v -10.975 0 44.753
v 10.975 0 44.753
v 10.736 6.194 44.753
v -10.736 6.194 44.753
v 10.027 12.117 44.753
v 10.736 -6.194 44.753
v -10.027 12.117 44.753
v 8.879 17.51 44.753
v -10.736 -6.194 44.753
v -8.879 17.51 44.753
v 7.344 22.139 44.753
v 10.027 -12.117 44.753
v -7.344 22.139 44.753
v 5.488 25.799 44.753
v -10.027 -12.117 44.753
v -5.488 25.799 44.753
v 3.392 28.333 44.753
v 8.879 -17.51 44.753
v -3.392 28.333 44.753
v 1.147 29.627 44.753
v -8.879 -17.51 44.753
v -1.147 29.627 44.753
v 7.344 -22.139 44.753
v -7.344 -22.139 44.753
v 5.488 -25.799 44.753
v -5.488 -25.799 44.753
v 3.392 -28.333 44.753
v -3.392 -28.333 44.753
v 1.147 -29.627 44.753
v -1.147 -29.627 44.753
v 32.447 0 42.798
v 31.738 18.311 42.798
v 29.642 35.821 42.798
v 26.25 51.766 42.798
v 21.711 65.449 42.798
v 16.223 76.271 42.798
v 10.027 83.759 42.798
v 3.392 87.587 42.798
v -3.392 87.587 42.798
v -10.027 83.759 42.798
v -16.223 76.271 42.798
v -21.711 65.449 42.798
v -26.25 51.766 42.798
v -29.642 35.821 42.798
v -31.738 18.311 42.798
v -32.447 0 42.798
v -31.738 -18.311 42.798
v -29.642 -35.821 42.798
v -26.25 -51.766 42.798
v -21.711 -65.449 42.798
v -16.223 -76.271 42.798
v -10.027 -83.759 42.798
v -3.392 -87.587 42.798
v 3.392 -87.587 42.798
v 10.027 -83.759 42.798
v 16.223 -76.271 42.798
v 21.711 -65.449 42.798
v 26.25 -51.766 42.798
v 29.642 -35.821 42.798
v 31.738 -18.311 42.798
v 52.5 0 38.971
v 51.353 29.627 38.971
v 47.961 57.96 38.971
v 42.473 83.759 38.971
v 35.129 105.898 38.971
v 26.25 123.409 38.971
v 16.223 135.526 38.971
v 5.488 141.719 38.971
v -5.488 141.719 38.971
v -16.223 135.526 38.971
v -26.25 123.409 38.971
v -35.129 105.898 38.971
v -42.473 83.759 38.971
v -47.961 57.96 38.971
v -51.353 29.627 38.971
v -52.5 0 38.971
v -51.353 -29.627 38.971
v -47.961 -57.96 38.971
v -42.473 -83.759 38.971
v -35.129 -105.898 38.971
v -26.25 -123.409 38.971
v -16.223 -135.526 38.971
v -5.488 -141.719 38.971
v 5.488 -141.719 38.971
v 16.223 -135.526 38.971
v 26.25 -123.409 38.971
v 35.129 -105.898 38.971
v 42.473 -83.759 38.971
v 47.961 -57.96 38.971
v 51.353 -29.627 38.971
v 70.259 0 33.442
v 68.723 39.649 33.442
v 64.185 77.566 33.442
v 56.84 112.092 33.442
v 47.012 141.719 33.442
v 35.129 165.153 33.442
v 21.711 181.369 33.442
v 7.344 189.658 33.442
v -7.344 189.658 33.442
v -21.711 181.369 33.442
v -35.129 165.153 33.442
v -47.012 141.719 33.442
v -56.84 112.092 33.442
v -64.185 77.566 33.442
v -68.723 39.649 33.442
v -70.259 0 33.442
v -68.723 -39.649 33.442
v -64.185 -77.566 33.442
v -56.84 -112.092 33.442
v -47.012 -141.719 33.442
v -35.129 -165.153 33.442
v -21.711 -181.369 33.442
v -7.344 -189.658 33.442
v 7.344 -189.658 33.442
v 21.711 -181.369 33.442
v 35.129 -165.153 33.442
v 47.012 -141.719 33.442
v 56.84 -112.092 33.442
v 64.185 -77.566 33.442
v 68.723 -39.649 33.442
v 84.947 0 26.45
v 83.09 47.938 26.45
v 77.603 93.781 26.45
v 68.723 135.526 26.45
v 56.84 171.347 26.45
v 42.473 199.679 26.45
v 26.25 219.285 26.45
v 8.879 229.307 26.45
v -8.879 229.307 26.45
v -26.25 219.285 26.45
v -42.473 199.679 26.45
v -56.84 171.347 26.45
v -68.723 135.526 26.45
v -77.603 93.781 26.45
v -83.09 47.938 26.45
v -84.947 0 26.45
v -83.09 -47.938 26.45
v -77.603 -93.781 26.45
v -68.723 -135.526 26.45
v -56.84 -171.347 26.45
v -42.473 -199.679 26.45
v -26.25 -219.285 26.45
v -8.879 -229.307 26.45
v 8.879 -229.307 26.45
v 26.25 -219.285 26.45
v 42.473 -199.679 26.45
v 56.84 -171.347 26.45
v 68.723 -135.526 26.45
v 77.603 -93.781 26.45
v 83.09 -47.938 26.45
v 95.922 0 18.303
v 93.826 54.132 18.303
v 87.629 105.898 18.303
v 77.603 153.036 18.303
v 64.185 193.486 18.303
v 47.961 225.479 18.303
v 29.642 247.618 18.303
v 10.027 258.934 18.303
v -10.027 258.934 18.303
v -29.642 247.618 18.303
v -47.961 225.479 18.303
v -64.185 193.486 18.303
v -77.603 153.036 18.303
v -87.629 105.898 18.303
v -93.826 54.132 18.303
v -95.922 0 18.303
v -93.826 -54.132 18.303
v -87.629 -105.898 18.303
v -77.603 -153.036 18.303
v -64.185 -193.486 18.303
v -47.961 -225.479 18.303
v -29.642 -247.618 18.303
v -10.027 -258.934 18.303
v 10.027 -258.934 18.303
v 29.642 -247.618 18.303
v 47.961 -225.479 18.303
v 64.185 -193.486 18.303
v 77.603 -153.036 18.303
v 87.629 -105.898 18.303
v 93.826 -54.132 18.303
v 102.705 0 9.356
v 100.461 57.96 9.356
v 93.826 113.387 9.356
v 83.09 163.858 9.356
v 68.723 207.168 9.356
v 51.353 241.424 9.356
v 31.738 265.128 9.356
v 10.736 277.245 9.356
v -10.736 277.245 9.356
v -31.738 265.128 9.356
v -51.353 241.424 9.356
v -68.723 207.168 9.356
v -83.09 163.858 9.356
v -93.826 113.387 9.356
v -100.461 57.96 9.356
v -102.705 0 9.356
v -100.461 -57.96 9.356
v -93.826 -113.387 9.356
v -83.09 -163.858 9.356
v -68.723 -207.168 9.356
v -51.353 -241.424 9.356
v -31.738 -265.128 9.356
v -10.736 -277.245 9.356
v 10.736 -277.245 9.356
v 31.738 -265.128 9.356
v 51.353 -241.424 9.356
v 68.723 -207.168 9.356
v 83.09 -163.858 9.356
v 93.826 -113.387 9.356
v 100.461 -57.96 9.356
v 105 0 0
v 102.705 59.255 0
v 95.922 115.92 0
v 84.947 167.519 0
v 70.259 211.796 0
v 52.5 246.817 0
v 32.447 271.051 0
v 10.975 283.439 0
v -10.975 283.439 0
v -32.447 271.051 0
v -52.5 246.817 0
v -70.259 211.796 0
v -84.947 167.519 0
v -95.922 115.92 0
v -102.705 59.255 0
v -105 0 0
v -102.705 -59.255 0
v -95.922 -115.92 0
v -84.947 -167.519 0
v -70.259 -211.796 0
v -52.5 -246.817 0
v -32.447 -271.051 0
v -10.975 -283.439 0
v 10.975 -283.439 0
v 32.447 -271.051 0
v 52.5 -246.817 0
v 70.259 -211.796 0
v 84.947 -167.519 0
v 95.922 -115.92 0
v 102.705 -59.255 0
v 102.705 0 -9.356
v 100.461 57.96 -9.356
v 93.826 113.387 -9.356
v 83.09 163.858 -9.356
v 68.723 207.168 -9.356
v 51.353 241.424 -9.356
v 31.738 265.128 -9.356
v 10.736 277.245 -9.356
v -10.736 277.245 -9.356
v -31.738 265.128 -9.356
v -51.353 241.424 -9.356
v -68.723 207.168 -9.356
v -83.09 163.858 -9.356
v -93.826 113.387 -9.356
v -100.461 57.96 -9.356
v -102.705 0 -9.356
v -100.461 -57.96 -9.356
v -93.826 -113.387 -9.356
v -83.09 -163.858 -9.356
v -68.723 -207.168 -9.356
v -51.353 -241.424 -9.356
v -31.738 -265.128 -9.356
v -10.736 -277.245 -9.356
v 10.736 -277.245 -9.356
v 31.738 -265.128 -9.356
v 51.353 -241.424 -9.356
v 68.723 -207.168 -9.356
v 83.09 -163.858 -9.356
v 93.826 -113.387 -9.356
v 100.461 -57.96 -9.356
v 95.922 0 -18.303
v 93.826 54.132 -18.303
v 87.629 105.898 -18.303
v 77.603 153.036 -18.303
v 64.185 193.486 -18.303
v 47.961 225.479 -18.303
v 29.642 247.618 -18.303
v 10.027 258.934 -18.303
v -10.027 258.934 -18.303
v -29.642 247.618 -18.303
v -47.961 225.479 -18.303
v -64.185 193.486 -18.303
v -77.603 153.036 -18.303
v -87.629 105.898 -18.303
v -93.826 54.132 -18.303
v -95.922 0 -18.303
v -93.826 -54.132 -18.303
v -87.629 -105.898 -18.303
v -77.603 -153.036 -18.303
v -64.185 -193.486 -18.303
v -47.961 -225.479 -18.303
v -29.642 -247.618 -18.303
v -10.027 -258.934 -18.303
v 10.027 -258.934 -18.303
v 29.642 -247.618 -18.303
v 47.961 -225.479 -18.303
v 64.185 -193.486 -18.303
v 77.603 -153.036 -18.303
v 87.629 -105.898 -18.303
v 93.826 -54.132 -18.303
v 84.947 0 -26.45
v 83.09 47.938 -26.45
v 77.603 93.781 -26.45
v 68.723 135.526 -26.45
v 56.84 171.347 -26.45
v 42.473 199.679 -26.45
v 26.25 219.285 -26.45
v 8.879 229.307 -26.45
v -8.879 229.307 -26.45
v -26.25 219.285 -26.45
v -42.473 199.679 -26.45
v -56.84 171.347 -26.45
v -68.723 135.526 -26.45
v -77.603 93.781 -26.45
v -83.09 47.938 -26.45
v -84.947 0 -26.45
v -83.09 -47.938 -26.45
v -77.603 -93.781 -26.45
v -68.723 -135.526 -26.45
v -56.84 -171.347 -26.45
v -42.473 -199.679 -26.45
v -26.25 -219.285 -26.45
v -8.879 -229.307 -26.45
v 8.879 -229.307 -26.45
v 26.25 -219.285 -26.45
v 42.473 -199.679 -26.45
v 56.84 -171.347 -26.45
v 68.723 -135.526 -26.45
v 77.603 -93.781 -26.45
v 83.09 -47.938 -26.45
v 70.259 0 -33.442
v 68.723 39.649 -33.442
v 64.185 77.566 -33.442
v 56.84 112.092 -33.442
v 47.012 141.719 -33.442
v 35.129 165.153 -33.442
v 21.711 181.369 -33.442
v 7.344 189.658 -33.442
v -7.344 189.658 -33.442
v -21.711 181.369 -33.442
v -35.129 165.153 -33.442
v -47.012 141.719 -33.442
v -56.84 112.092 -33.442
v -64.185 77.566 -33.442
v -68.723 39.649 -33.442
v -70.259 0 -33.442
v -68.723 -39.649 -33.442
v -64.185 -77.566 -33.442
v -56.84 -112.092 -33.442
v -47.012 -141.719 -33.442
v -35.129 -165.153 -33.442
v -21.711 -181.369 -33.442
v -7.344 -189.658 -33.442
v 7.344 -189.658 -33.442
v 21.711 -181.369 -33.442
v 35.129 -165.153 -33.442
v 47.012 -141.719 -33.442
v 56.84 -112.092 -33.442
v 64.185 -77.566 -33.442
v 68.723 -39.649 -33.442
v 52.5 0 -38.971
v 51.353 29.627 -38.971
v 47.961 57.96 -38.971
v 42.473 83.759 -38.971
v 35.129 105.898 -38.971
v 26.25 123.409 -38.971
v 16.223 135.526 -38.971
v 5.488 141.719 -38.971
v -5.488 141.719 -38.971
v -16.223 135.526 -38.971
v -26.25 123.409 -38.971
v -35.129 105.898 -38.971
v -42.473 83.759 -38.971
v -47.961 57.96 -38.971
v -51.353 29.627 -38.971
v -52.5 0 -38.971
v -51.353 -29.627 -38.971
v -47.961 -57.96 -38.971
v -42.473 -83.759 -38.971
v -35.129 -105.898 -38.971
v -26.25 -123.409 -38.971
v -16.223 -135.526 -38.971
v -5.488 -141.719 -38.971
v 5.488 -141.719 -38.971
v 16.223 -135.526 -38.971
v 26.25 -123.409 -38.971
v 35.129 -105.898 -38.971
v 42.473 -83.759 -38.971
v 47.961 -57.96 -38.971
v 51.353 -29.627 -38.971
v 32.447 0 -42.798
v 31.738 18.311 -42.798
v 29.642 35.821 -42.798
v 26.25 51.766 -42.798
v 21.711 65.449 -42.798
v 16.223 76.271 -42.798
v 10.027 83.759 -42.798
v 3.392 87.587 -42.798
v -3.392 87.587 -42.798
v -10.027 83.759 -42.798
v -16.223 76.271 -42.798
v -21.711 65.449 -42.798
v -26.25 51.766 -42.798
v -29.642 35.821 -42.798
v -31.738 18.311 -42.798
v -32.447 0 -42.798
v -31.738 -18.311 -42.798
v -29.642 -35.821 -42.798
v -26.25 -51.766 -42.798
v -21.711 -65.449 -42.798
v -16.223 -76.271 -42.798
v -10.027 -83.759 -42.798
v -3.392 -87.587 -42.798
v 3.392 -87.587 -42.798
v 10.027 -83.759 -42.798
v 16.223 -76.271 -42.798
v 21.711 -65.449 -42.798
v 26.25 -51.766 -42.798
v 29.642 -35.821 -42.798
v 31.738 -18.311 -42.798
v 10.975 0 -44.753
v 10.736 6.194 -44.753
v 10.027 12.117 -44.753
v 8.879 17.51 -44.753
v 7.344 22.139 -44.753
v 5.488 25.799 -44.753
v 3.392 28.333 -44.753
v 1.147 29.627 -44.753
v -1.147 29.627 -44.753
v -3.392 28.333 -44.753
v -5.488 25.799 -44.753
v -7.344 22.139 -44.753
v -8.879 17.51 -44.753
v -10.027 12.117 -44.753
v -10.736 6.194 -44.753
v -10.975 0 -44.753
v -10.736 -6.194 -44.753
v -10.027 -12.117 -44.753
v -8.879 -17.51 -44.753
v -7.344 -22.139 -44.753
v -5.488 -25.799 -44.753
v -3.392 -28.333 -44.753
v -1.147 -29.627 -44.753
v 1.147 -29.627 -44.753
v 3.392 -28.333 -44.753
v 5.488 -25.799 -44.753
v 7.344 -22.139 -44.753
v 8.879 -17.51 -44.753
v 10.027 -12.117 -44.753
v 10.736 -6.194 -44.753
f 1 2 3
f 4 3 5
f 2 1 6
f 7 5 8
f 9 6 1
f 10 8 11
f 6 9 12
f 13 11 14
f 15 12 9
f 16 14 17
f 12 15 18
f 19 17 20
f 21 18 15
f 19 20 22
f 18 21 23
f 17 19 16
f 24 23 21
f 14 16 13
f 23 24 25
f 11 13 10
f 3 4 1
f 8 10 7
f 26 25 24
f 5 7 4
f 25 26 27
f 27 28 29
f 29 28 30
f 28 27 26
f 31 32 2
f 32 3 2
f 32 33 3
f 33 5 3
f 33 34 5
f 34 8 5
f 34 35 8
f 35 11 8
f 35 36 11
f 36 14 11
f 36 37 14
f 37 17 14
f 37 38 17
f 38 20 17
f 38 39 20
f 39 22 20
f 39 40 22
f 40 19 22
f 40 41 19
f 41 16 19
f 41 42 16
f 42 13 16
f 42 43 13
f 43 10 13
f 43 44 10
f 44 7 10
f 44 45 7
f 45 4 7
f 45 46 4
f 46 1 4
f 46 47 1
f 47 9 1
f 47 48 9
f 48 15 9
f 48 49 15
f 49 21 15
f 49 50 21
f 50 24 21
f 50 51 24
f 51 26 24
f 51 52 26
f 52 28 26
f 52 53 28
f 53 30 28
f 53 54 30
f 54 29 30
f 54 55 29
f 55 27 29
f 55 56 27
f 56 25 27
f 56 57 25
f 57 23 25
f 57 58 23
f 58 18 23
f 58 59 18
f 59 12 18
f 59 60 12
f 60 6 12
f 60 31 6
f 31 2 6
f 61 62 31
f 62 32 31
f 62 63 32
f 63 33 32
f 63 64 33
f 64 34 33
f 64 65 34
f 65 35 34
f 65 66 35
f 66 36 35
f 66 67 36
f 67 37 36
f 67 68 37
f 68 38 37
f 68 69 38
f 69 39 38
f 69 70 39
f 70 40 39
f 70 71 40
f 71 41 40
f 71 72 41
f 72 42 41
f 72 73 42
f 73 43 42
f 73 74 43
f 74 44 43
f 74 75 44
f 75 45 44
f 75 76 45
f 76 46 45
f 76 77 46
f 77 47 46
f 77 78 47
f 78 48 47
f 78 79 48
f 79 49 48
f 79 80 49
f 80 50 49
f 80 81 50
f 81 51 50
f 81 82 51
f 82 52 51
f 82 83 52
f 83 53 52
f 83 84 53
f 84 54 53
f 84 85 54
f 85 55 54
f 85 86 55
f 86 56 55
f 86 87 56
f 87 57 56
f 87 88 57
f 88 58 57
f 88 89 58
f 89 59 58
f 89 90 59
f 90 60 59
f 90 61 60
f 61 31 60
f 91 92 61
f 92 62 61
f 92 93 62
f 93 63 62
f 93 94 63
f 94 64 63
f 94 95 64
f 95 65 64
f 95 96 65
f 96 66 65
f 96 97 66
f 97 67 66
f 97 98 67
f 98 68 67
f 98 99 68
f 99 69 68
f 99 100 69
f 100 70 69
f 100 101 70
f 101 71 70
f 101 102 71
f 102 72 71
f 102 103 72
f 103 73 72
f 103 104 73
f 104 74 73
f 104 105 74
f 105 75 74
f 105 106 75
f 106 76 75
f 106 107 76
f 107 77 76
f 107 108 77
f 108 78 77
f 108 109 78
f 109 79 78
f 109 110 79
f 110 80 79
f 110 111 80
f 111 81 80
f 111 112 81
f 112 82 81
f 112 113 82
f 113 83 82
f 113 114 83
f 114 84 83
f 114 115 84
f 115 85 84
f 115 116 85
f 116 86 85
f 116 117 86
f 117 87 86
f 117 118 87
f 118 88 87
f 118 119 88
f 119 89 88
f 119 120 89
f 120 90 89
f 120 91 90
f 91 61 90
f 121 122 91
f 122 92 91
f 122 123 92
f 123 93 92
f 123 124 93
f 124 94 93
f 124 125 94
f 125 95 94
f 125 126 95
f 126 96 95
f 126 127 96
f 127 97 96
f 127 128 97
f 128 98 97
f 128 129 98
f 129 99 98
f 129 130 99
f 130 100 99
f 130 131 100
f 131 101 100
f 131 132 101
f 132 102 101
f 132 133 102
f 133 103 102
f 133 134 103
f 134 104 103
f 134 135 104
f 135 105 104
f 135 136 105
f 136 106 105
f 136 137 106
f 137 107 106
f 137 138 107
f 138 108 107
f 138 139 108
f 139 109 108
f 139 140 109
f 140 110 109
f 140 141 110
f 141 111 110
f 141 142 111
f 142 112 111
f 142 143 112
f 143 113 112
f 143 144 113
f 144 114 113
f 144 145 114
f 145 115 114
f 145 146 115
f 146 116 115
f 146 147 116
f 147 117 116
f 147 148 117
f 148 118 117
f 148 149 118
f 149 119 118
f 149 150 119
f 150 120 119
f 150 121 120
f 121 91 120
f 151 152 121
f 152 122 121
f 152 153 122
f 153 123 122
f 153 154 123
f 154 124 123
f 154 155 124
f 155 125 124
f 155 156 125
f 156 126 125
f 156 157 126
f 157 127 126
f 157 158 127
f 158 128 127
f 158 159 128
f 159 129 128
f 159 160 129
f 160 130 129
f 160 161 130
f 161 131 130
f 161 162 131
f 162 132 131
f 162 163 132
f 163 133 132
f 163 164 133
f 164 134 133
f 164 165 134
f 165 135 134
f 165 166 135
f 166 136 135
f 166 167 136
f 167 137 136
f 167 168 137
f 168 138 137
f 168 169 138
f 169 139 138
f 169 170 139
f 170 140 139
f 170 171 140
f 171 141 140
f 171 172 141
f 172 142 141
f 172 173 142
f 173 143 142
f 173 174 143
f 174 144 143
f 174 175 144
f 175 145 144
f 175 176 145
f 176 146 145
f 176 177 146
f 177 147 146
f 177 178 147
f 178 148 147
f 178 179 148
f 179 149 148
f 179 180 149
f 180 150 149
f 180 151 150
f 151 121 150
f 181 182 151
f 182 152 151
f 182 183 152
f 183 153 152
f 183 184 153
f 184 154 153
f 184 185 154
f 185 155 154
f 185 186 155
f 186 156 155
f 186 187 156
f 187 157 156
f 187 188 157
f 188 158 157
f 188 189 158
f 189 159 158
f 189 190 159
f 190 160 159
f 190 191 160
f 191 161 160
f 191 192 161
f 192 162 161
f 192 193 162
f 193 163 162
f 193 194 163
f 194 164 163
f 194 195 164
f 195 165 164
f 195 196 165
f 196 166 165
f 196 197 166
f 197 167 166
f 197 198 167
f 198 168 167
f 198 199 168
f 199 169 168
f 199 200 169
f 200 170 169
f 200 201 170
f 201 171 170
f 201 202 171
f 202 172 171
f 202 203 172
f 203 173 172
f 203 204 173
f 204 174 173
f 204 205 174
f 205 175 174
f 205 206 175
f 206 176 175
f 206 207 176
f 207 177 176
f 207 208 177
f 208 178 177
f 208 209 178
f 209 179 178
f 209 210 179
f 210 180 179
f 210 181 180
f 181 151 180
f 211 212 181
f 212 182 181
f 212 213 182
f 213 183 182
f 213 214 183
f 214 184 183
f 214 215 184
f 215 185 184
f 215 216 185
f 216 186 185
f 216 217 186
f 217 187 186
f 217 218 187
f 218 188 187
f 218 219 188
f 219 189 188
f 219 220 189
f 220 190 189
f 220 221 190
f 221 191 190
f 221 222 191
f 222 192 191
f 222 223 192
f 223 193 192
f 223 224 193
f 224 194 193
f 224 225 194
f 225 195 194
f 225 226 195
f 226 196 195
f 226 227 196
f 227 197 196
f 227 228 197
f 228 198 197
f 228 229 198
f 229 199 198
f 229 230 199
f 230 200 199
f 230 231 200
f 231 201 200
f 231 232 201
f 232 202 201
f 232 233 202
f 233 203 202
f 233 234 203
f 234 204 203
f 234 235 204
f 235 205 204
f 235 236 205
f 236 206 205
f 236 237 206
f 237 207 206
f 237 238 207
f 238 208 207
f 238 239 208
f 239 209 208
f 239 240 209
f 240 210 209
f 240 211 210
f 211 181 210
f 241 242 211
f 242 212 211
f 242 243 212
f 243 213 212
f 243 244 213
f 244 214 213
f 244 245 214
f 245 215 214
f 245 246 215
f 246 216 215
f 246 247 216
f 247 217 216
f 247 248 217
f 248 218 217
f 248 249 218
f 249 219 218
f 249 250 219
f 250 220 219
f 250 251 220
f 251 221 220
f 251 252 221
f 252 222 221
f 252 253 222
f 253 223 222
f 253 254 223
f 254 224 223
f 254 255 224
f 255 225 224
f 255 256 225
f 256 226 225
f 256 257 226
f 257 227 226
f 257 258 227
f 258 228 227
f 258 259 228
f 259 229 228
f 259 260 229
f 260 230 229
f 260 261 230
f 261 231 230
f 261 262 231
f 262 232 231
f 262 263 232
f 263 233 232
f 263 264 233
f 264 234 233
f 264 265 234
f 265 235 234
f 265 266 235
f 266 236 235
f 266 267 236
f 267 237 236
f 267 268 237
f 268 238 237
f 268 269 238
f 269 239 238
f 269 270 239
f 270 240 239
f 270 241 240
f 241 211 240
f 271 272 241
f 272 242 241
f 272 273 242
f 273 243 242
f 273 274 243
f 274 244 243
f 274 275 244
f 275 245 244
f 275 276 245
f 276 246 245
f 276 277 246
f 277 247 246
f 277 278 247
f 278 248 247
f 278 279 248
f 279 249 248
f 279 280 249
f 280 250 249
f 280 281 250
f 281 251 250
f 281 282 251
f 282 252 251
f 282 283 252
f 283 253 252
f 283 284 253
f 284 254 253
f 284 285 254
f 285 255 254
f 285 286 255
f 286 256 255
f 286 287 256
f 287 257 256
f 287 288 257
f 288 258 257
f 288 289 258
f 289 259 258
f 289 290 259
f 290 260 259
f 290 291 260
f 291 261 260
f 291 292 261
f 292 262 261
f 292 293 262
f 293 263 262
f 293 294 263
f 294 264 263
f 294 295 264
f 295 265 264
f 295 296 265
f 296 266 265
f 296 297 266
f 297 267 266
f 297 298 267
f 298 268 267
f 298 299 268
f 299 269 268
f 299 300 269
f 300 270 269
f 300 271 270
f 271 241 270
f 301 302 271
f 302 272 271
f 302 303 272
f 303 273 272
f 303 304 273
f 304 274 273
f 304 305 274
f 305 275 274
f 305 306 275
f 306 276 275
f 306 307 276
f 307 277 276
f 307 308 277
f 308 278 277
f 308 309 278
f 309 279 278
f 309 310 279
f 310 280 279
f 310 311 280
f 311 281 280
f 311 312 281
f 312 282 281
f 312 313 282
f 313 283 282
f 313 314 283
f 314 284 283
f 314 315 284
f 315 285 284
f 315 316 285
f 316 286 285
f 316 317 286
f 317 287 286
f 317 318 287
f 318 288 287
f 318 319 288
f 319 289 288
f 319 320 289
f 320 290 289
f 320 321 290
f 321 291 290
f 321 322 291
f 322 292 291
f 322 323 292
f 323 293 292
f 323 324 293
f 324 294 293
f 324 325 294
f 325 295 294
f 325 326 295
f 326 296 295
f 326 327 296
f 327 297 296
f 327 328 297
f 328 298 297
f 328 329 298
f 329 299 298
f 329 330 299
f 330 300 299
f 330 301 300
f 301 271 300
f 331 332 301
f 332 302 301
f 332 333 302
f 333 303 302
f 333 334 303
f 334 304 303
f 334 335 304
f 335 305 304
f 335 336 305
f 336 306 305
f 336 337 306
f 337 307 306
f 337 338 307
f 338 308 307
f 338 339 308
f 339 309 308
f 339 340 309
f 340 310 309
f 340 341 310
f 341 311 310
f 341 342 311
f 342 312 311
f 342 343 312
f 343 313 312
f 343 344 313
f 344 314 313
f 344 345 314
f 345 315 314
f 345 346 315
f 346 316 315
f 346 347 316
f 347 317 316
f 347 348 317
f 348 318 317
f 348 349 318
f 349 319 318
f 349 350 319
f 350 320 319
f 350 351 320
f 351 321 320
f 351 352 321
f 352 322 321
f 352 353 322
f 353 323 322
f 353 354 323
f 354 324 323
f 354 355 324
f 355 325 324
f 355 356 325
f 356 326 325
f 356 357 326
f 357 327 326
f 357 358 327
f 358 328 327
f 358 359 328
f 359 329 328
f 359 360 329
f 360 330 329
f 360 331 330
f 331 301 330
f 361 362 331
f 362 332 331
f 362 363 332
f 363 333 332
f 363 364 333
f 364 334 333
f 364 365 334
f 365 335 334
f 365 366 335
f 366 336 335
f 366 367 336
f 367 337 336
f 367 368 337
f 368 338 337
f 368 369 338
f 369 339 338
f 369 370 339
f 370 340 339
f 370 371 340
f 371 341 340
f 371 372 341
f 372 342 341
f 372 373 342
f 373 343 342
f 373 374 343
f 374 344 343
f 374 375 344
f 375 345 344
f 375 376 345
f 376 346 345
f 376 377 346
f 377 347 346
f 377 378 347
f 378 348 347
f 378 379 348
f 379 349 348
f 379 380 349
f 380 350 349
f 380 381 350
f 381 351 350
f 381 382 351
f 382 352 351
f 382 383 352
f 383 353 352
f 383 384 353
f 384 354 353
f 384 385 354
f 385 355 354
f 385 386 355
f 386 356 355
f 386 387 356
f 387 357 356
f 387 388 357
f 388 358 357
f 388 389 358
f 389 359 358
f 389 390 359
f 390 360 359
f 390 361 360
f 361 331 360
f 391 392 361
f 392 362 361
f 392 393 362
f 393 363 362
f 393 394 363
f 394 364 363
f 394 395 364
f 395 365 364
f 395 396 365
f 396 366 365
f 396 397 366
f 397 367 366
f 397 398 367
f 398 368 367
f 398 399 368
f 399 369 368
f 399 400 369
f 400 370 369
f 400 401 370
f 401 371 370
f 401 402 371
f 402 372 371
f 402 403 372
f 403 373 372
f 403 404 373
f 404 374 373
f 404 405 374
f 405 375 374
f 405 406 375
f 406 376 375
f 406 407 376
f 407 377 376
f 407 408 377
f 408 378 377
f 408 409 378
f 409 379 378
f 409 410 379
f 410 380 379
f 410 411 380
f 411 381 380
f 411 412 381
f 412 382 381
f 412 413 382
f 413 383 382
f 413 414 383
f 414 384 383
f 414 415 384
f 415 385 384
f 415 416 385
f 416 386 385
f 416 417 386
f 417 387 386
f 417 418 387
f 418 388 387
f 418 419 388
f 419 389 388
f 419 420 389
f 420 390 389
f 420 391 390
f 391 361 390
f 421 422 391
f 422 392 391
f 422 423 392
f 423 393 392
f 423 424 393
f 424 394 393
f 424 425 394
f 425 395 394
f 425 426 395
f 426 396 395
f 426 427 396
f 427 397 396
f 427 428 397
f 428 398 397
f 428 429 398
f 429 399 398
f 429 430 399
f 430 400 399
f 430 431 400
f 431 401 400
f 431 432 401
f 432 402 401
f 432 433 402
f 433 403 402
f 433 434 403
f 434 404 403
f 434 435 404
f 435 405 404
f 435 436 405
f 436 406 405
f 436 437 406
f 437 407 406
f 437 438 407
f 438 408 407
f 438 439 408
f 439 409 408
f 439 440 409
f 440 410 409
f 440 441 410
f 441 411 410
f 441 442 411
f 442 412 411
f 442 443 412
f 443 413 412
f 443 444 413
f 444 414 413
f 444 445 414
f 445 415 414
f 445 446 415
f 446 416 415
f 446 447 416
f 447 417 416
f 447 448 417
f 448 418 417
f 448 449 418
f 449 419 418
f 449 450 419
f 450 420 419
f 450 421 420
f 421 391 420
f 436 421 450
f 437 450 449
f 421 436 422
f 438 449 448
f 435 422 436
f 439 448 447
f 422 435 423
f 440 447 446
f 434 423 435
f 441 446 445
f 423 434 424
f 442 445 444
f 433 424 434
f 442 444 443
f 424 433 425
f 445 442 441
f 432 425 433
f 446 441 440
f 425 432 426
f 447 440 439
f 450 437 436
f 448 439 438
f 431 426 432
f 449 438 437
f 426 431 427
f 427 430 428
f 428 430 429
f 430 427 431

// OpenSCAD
// Generated by SolidPython 1.0.1 on 2020-07-29 00:46:48


scale(v = [7, 19, 3]) {
	sphere(r = 15);
}
/***********************************************
*********      SolidPython code:      **********
************************************************
 
# import packages: SolidPython
from solid import *
from solid.utils import *
from itertools import chain, combinations, permutations


class Resize:

    def __init__(self, scad_file):
        self.scad_file = scad_file
        #self.scad_file = import_scad(scad_file)
        # cone/cylinder param:
        self.r1 = 0
        self.r2 = 0
        self.h = 0
        # rectangular prism param:
        self.w = 0
        self.l = 0
        # ellipse param:
        self.r = 0

    # import OpenScad code (file name corresponds to shape)


    # classify shape + parameters
    def assign(self, param1, param2, param3):
        if self.scad_file == 'cone.scad':
            self.r1 = param1
            self.r2 = param2
            self.h = param3
        elif self.scad_file == 'cylinder.scad':
            self.r1 = param1
            self.r2 = param2
            self.h = param3
        elif self.scad_file == 'rectangularPrism.scad':
            self.h = param1
            self.l = param2
            self.w = param3
        else:
            self.r = param1
            self.h = param2

    # resize parameters
    def iterate(self):
        x = range(3, 20, 2)
        i = 1
        if self.scad_file == 'cone.scad':
            tempList = list(permutations(x, 2))
            for temp in tempList:
                param1 = temp[0]
                param2 = temp[1]
                filepath = 'produced_scad_files/' + 'cone' + str(param1) + '_' + str(param2) + '_' + '.scad'
                scad_render_to_file(cylinder(h=param1, r1=param2, r2=0), filepath)

        elif self.scad_file == 'cylinder.scad':
            tempList = list(permutations(x, 3))
            for temp in tempList:
                param1 = temp[0]
                param2 = temp[1]
                filepath = 'produced_scad_files/' + 'cylinder' + str(param1) + '_' + str(param2) + '_' + '.scad'
                scad_render_to_file(cylinder(h=param1, r1=param2, r2=param2), filepath)

        elif self.scad_file == 'rectangularPrism.scad':
            tempList = list(permutations(x, 3))
            for temp in tempList:
                param1 = temp[0]
                param2 = temp[1]
                param3 = temp[2]
                filepath = 'produced_scad_files/' + 'rectangularPrism' + str(param1) + '_' + str(param2) + '_' + str(
                    param3) + '.scad'
                scad_render_to_file(cube(size=(param1, param2, param3)), filepath)

        elif self.scad_file == 'ellipse.scad':
            tempList = list(permutations(x, 4))
            for temp in tempList:
                param1 = temp[0]
                param2 = temp[1]
                param3 = temp[2]
                param4 = temp[3]
                filepath = 'produced_scad_files/' + 'ellipse' + str(param1) + '_' + str(param2) + '_' + str(param3) + '_' + str(param4) + '.scad'
                scad_render_to_file(scale([param1, param2, param3])(sphere(r=param4)), filepath)

    def render_to_scadfile(self):
        scad_render_to_file(scad, 'example.scad') 
 
************************************************/
